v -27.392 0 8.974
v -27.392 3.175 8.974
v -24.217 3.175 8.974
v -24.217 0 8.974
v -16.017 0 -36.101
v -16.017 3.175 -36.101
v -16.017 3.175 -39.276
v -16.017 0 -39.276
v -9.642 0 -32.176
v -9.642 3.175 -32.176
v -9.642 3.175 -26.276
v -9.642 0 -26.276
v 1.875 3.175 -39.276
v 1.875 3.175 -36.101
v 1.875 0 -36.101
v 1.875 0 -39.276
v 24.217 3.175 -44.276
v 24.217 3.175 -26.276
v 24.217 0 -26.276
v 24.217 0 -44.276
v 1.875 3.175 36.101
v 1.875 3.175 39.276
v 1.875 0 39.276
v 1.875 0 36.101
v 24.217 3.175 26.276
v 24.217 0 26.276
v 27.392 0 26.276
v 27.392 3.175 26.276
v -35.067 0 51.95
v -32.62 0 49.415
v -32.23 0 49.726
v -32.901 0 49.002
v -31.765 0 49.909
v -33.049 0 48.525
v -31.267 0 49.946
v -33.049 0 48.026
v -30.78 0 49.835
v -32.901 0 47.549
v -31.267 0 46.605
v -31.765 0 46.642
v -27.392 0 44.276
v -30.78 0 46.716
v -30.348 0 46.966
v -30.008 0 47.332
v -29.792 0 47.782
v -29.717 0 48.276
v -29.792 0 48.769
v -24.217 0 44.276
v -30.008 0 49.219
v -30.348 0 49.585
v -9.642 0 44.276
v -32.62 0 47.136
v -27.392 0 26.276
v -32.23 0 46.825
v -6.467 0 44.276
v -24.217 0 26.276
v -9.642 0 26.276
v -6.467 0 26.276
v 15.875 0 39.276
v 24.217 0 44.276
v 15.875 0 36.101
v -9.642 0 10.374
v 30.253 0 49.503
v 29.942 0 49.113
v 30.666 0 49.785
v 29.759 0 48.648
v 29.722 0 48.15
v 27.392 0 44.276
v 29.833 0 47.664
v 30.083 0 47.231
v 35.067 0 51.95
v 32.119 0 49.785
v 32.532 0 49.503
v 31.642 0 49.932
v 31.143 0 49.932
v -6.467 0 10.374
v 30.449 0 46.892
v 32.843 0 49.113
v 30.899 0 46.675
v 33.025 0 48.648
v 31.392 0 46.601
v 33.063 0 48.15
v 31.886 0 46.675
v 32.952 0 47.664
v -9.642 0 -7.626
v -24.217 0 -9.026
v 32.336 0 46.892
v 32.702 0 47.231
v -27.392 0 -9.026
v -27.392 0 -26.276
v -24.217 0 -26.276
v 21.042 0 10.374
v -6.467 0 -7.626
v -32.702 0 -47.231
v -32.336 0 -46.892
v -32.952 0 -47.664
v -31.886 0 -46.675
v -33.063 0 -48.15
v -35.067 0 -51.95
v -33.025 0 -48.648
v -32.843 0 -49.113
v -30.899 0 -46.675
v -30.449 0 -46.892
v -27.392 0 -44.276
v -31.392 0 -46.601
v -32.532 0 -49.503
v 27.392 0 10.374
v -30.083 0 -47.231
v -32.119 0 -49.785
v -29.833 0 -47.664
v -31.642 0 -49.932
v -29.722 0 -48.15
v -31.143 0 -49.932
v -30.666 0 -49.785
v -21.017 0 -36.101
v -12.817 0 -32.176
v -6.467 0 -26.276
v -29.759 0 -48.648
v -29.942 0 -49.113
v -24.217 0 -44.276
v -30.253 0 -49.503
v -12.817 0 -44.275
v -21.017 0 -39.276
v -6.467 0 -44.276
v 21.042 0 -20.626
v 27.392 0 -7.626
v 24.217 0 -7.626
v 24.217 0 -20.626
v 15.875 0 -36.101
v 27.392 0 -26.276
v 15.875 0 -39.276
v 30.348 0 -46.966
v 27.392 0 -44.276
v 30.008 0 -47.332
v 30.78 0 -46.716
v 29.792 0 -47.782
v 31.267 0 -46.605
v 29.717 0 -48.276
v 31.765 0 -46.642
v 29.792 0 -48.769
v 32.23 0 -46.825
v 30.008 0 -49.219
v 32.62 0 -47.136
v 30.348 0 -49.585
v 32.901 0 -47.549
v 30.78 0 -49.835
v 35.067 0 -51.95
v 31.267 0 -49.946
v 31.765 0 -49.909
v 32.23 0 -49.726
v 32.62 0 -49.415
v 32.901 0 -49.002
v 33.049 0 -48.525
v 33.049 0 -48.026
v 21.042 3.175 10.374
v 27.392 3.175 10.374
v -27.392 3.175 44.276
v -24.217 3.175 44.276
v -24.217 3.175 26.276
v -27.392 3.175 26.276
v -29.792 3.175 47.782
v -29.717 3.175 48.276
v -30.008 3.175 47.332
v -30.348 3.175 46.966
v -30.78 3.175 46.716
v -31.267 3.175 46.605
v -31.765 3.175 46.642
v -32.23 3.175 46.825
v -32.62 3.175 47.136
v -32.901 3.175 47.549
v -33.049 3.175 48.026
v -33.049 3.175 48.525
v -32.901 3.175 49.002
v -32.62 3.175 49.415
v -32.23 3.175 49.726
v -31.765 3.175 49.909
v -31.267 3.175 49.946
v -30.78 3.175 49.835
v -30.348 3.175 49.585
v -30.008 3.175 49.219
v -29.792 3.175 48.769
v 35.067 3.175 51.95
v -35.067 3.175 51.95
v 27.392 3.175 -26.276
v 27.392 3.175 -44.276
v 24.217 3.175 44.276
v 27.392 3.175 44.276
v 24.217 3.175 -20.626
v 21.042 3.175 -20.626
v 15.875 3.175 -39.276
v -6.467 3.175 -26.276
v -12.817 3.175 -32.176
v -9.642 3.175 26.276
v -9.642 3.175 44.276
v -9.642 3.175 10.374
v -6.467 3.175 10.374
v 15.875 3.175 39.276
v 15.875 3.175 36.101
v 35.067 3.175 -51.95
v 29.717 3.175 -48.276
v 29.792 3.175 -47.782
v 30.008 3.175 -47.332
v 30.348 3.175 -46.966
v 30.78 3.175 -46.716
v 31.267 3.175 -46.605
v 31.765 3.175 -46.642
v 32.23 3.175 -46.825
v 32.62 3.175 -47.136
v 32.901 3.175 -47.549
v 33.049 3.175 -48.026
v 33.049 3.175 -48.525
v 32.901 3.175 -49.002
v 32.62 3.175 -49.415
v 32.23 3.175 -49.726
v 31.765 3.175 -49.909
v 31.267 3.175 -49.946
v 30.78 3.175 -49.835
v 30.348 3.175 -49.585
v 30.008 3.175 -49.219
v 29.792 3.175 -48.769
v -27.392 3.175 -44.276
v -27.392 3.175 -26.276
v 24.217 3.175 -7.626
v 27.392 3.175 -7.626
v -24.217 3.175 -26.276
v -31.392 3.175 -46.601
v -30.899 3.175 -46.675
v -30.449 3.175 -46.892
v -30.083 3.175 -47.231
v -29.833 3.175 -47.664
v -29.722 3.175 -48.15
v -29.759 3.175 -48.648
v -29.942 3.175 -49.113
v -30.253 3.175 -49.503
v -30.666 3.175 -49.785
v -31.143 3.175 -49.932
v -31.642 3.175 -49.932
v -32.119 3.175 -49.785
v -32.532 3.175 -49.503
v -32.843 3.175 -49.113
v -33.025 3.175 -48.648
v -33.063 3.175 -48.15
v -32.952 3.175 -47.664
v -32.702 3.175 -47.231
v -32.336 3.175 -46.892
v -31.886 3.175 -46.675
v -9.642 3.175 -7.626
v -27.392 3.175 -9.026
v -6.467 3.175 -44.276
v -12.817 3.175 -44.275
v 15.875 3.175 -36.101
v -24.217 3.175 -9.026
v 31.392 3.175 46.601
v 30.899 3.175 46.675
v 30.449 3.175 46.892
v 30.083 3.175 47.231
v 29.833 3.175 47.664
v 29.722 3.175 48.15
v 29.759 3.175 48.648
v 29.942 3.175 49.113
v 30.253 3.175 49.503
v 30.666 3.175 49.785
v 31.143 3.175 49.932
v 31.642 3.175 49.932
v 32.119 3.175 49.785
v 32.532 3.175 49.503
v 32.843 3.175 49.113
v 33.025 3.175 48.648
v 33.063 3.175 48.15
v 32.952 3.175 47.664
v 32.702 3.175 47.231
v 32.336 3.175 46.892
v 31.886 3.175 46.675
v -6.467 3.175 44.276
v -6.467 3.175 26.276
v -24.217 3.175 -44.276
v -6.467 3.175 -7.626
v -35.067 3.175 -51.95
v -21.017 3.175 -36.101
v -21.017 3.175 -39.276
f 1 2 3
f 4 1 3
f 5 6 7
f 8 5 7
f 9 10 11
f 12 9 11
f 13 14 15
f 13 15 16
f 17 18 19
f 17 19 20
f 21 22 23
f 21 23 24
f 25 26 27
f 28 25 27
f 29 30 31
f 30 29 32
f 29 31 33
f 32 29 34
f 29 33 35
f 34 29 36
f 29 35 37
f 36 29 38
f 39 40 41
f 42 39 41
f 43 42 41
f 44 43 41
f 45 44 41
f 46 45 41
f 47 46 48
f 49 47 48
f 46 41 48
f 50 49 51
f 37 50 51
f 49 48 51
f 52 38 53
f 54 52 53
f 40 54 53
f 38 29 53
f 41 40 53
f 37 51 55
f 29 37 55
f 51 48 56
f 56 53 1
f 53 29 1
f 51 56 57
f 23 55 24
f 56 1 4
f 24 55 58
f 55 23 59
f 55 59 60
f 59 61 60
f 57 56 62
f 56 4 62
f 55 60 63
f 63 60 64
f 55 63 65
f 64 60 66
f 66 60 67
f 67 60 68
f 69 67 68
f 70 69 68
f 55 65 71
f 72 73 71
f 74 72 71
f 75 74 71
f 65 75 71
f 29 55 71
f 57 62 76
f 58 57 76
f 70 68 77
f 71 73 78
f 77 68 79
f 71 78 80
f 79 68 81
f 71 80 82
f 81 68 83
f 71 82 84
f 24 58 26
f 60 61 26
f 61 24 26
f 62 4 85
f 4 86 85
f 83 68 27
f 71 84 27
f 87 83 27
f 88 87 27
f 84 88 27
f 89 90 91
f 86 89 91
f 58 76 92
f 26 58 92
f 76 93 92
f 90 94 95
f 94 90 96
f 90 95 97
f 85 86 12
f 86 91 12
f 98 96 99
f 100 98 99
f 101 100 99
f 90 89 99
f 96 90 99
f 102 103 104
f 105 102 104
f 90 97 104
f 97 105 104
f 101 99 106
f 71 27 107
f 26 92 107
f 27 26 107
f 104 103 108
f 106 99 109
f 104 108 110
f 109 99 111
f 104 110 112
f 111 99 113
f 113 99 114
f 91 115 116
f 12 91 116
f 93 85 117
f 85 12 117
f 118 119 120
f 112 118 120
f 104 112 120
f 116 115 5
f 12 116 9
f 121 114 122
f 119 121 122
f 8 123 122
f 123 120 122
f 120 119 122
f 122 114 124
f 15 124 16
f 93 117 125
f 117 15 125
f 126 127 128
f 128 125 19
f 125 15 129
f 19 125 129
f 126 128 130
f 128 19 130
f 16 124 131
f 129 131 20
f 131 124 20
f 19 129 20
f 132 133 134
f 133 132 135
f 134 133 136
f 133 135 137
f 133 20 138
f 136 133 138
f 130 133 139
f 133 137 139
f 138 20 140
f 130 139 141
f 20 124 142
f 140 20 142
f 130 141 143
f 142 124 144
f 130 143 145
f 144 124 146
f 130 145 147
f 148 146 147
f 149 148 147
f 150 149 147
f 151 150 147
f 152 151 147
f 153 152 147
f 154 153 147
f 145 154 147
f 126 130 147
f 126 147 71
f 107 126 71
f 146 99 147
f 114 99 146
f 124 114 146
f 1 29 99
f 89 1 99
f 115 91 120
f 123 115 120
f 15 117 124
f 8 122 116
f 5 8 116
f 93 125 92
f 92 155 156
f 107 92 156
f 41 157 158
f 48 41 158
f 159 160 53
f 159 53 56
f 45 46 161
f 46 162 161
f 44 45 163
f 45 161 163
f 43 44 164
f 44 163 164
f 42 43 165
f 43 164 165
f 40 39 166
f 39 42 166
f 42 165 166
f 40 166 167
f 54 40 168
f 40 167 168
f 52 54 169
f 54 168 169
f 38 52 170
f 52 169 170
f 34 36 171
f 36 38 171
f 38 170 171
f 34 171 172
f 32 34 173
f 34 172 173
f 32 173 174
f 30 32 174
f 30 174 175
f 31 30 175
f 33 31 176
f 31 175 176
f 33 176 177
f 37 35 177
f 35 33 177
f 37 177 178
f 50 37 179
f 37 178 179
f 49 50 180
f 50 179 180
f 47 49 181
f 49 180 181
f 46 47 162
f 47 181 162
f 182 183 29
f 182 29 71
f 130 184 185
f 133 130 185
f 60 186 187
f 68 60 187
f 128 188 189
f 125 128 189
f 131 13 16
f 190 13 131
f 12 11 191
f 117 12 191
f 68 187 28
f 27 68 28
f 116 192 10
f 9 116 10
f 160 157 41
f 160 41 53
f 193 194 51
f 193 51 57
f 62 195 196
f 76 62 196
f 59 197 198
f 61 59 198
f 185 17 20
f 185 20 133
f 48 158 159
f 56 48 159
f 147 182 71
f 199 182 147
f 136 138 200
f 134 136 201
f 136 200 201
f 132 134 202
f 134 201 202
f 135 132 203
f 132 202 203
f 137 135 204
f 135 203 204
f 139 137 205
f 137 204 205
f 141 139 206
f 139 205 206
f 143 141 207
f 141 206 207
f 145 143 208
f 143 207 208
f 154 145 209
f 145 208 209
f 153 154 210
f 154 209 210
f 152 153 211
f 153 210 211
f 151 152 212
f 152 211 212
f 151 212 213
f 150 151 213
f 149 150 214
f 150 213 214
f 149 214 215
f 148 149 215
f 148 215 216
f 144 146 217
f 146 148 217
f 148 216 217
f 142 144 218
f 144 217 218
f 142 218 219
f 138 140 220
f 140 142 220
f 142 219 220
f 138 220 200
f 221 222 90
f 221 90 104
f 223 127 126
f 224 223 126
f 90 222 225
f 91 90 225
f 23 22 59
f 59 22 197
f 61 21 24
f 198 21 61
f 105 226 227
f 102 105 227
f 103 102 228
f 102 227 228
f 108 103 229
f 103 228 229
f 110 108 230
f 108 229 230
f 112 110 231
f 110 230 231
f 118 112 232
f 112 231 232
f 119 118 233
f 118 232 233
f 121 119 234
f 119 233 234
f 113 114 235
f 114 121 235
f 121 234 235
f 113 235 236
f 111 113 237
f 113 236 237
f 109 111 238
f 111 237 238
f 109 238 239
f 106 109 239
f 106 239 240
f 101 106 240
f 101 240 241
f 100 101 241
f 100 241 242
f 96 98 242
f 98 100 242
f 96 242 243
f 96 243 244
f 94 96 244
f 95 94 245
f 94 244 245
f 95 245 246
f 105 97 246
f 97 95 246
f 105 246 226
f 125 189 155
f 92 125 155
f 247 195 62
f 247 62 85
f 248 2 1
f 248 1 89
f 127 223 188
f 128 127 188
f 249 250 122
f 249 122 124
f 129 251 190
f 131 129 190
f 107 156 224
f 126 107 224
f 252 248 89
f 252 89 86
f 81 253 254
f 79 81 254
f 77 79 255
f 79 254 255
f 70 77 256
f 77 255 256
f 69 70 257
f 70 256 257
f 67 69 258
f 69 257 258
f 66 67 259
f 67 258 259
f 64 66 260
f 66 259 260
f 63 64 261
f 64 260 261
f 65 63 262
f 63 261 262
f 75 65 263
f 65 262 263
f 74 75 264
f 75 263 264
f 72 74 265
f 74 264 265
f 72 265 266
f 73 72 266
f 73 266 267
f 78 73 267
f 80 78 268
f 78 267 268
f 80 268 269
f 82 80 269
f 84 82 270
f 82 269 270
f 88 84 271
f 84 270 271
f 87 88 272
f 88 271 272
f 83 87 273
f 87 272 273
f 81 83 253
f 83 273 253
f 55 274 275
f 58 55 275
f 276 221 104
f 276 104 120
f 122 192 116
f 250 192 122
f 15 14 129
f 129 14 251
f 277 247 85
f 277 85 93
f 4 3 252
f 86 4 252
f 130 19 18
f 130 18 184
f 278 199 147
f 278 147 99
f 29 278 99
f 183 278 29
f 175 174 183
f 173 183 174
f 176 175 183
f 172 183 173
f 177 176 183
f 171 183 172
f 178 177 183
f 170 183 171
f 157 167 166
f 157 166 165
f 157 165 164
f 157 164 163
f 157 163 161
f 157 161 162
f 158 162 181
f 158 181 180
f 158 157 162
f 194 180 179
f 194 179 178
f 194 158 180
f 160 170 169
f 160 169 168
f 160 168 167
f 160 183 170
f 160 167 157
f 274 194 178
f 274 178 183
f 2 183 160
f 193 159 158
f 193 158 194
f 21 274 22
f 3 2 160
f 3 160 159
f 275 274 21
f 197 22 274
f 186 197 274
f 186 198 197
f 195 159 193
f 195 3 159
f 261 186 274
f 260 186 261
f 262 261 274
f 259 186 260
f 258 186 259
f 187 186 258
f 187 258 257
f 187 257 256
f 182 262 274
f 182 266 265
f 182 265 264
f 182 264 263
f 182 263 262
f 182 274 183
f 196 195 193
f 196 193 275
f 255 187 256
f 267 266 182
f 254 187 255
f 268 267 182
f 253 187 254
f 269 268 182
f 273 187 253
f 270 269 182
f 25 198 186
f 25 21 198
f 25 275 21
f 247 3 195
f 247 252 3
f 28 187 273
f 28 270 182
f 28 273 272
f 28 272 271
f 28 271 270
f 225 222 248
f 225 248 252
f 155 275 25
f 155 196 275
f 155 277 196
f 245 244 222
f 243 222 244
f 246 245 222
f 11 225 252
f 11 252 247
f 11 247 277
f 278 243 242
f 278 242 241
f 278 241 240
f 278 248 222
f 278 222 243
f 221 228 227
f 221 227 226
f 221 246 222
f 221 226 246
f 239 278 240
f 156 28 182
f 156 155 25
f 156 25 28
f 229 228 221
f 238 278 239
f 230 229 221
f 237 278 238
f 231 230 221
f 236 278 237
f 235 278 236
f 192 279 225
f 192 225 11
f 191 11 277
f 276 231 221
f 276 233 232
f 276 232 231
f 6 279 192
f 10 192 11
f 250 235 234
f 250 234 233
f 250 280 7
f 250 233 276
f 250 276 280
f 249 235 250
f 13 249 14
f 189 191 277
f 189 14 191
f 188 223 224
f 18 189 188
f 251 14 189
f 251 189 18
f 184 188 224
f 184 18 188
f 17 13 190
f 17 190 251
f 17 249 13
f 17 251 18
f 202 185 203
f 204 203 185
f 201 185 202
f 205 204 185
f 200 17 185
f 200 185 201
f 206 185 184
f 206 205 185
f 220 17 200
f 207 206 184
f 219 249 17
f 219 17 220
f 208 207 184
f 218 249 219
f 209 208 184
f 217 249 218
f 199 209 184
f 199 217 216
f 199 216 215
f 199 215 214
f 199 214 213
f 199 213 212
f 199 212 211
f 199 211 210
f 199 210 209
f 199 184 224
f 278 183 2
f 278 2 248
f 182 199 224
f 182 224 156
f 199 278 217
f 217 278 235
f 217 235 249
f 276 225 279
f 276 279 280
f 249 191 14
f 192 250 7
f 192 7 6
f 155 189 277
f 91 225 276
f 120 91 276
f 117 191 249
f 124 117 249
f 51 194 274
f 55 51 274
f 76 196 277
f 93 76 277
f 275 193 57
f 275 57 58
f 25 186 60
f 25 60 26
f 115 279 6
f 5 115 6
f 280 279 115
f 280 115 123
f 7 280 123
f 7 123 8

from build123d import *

# Parameters (mm, degrees)
SKETCH2_W           = 54.7846
SKETCH2_H           = 88.551
BOSS_EXTRUDE1_DEPTH = 3.175
SKETCH7_W           = 3.175
SKETCH7_H           = 18
SKETCH7_W_2         = 5
SKETCH7_H_2         = 3.175
SKETCH7_H_3         = 12.1
SKETCH7_W_3         = 14
CUT_EXTRUDE1_DEPTH  = 10
SKETCH8_W           = 62.7846
SKETCH8_H           = 96.551
SKETCH8_W_2         = 54.7846
SKETCH8_H_2         = 88.551
BOSS_EXTRUDE2_DEPTH = 3.175
SKETCH12_R          = 3.675
SKETCH12_R_2        = 1.675
BOSS_EXTRUDE4_DEPTH = 3.175
SKETCH13_R          = 1.675
CUT_EXTRUDE4_DEPTH  = 10
BOSS_EXTRUDE5_DEPTH = 3.175


with BuildPart() as part:
    # Sketch2 → Boss-Extrude1 (new body)
    with BuildSketch(Plane(origin=(0, 0, 0), x_dir=(1, 0, 0), z_dir=(0, 1, 0))):
        Rectangle(SKETCH2_W, SKETCH2_H)
    extrude(amount=BOSS_EXTRUDE1_DEPTH)

    # Sketch7 → Cut-Extrude1 (cut)
    with BuildSketch(Plane(origin=(0, 3.175, 0), x_dir=(1, 0, 0), z_dir=(0, 1, 0))):
        with Locations((-25.8048, 35.2755)):
            Rectangle(SKETCH7_W, SKETCH7_H)
        with Locations((-18.5173, 37.688)):
            Rectangle(SKETCH7_W_2, SKETCH7_H_2)
        with Locations((-11.2298, 38.2255)):
            Rectangle(SKETCH7_W, SKETCH7_H_3)
        Polygon((-6.4673, 44.2755), (-9.6423, 44.2755), (-9.6423, 32.1755), (-9.6423, 26.2755), (-6.4673, 26.2755), align=None)
        with Locations((8.875, 37.688)):
            Rectangle(SKETCH7_W_3, SKETCH7_H_2)
        with Locations((25.8048, 35.2755)):
            Rectangle(SKETCH7_W, SKETCH7_H)
        Polygon((24.2173, -10.3745), (24.2173, 7.6255), (24.2173, 20.6255), (21.0423, 20.6255), (21.0423, -10.3745), align=None)
        with Locations((25.8048, -1.3745)):
            Rectangle(SKETCH7_W, SKETCH7_H)
        with Locations((-8.0548, -1.3745)):
            Rectangle(SKETCH7_W, SKETCH7_H)
        with Locations((-25.8048, 0.0255)):
            Rectangle(SKETCH7_W, SKETCH7_H)
        with Locations((-25.8048, -35.2755)):
            Rectangle(SKETCH7_W, SKETCH7_H)
        with Locations((-8.0548, -35.2755)):
            Rectangle(SKETCH7_W, SKETCH7_H)
        with Locations((8.875, -37.688)):
            Rectangle(SKETCH7_W_3, SKETCH7_H_2)
        with Locations((25.8048, -35.2755)):
            Rectangle(SKETCH7_W, SKETCH7_H)
    extrude(amount=-CUT_EXTRUDE1_DEPTH, mode=Mode.SUBTRACT)

    # Sketch8 → Boss-Extrude2 (add)
    with BuildSketch(Plane(origin=(0, 3.175, 0), x_dir=(1, 0, 0), z_dir=(0, 1, 0))):
        Rectangle(SKETCH8_W, SKETCH8_H)
        Rectangle(SKETCH8_W_2, SKETCH8_H_2, mode=Mode.SUBTRACT)
    extrude(amount=-BOSS_EXTRUDE2_DEPTH)

    # Sketch12 → Boss-Extrude4 (add)
    # profile 1 of 4: a face of its own
    with BuildSketch(Plane(origin=(0, 3.175, 0), x_dir=(1, 0, 0), z_dir=(0, 1, 0))):
        with Locations((-31.3923, -48.2755)):
            Circle(SKETCH12_R)
        with Locations((-31.3923, -48.2755)):
            Circle(SKETCH12_R_2, mode=Mode.SUBTRACT)
    # profile 2 of 4: a face of its own
    with BuildSketch(Plane(origin=(0, 3.175, 0), x_dir=(1, 0, 0), z_dir=(0, 1, 0))):
        with Locations((31.3923, -48.2755)):
            Circle(SKETCH12_R)
        with Locations((31.3923, -48.2755)):
            Circle(SKETCH12_R_2, mode=Mode.SUBTRACT)
    # profile 3 of 4: a face of its own
    with BuildSketch(Plane(origin=(0, 3.175, 0), x_dir=(1, 0, 0), z_dir=(0, 1, 0))):
        with Locations((31.3923, 48.2755)):
            Circle(SKETCH12_R)
        with Locations((31.3923, 48.2755)):
            Circle(SKETCH12_R_2, mode=Mode.SUBTRACT)
    # profile 4 of 4: a face of its own
    with BuildSketch(Plane(origin=(0, 3.175, 0), x_dir=(1, 0, 0), z_dir=(0, 1, 0))):
        with Locations((-31.3923, 48.2755)):
            Circle(SKETCH12_R)
        with Locations((-31.3923, 48.2755)):
            Circle(SKETCH12_R_2, mode=Mode.SUBTRACT)
    extrude(amount=-BOSS_EXTRUDE4_DEPTH)

    # Sketch13 → Cut-Extrude4 (cut)
    with BuildSketch(Plane(origin=(0, 3.175, 0), x_dir=(1, 0, 0), z_dir=(0, 1, 0))):
        with Locations(Location((-31.3923, 48.2755, 0), (0, 0, 270))):
            Circle(SKETCH13_R)
        with Locations(Location((31.3923, 48.2755, 0), (0, 0, 270))):
            Circle(SKETCH13_R)
        with Locations(Location((31.3923, -48.2755, 0), (0, 0, 270))):
            Circle(SKETCH13_R)
        with Locations(Location((-31.3923, -48.2755, 0), (0, 0, 270))):
            Circle(SKETCH13_R)
    extrude(amount=-CUT_EXTRUDE4_DEPTH, mode=Mode.SUBTRACT)

    # Sketch14 → Boss-Extrude5 (add)
    with BuildSketch(Plane(origin=(0, 3.175, 0), x_dir=(1, 0, 0), z_dir=(0, 1, 0))):
        with BuildLine():
            Line((-35.0673, 48.2755), (-35.0673, -48.2755))
            ThreePointArc((-35.0673, -48.2755), (-33.990917421, -45.676882579), (-31.3923, -44.6005))
            Line((-31.3923, -44.6005), (-31.3923, 44.6005))
            ThreePointArc((-31.3923, 44.6005), (-33.990917421, 45.676882579), (-35.0673, 48.2755))
        make_face()
        with BuildLine():
            Line((31.392300042, 51.9505), (-31.3923, 51.9505))
            ThreePointArc((-31.3923, 51.9505), (-28.793682579, 50.874117421), (-27.7173, 48.2755))
            Line((-27.7173, 48.2755), (27.7173, 48.2755))
            ThreePointArc((27.7173, 48.2755), (28.793682594, 50.874117436), (31.392300042, 51.9505))
        make_face()
        with BuildLine():
            Line((-35.0673, 51.9505), (-35.0673, 48.2755))
            ThreePointArc((-35.0673, 48.2755), (-33.990917421, 50.874117421), (-31.3923, 51.9505))
            Line((-31.3923, 51.9505), (-35.0673, 51.9505))
        make_face()
        with BuildLine():
            ThreePointArc((31.3923, -44.6005), (33.990917421, -45.676882579), (35.0673, -48.2755))
            Line((35.0673, -48.2755), (35.0673, 48.2755))
            ThreePointArc((35.0673, 48.2755), (33.990917421, 45.676882579), (31.3923, 44.6005))
            Line((31.3923, 44.6005), (31.3923, -44.6005))
        make_face()
        with BuildLine():
            ThreePointArc((31.392300042, 51.9505), (33.990917436, 50.874117406), (35.0673, 48.2755))
            Line((35.0673, 48.2755), (35.0673, 51.9505))
            Line((35.0673, 51.9505), (31.392300042, 51.9505))
        make_face()
        with BuildLine():
            ThreePointArc((35.0673, -48.2755), (33.990917421, -50.874117421), (31.3923, -51.9505))
            Line((31.3923, -51.9505), (35.0673, -51.9505))
            Line((35.0673, -51.9505), (35.0673, -48.2755))
        make_face()
        with BuildLine():
            ThreePointArc((-27.7173, -48.2755), (-28.793682579, -50.874117421), (-31.3923, -51.9505))
            Line((-31.3923, -51.9505), (31.3923, -51.9505))
            ThreePointArc((31.3923, -51.9505), (28.793682579, -50.874117421), (27.7173, -48.2755))
            Line((27.7173, -48.2755), (-27.7173, -48.2755))
        make_face()
        with BuildLine():
            Line((-35.0673, -48.2755), (-35.0673, -51.9505))
            Line((-35.0673, -51.9505), (-31.3923, -51.9505))
            ThreePointArc((-31.3923, -51.9505), (-33.990917421, -50.874117421), (-35.0673, -48.2755))
        make_face()
    extrude(amount=-BOSS_EXTRUDE5_DEPTH)


solid = part.part
